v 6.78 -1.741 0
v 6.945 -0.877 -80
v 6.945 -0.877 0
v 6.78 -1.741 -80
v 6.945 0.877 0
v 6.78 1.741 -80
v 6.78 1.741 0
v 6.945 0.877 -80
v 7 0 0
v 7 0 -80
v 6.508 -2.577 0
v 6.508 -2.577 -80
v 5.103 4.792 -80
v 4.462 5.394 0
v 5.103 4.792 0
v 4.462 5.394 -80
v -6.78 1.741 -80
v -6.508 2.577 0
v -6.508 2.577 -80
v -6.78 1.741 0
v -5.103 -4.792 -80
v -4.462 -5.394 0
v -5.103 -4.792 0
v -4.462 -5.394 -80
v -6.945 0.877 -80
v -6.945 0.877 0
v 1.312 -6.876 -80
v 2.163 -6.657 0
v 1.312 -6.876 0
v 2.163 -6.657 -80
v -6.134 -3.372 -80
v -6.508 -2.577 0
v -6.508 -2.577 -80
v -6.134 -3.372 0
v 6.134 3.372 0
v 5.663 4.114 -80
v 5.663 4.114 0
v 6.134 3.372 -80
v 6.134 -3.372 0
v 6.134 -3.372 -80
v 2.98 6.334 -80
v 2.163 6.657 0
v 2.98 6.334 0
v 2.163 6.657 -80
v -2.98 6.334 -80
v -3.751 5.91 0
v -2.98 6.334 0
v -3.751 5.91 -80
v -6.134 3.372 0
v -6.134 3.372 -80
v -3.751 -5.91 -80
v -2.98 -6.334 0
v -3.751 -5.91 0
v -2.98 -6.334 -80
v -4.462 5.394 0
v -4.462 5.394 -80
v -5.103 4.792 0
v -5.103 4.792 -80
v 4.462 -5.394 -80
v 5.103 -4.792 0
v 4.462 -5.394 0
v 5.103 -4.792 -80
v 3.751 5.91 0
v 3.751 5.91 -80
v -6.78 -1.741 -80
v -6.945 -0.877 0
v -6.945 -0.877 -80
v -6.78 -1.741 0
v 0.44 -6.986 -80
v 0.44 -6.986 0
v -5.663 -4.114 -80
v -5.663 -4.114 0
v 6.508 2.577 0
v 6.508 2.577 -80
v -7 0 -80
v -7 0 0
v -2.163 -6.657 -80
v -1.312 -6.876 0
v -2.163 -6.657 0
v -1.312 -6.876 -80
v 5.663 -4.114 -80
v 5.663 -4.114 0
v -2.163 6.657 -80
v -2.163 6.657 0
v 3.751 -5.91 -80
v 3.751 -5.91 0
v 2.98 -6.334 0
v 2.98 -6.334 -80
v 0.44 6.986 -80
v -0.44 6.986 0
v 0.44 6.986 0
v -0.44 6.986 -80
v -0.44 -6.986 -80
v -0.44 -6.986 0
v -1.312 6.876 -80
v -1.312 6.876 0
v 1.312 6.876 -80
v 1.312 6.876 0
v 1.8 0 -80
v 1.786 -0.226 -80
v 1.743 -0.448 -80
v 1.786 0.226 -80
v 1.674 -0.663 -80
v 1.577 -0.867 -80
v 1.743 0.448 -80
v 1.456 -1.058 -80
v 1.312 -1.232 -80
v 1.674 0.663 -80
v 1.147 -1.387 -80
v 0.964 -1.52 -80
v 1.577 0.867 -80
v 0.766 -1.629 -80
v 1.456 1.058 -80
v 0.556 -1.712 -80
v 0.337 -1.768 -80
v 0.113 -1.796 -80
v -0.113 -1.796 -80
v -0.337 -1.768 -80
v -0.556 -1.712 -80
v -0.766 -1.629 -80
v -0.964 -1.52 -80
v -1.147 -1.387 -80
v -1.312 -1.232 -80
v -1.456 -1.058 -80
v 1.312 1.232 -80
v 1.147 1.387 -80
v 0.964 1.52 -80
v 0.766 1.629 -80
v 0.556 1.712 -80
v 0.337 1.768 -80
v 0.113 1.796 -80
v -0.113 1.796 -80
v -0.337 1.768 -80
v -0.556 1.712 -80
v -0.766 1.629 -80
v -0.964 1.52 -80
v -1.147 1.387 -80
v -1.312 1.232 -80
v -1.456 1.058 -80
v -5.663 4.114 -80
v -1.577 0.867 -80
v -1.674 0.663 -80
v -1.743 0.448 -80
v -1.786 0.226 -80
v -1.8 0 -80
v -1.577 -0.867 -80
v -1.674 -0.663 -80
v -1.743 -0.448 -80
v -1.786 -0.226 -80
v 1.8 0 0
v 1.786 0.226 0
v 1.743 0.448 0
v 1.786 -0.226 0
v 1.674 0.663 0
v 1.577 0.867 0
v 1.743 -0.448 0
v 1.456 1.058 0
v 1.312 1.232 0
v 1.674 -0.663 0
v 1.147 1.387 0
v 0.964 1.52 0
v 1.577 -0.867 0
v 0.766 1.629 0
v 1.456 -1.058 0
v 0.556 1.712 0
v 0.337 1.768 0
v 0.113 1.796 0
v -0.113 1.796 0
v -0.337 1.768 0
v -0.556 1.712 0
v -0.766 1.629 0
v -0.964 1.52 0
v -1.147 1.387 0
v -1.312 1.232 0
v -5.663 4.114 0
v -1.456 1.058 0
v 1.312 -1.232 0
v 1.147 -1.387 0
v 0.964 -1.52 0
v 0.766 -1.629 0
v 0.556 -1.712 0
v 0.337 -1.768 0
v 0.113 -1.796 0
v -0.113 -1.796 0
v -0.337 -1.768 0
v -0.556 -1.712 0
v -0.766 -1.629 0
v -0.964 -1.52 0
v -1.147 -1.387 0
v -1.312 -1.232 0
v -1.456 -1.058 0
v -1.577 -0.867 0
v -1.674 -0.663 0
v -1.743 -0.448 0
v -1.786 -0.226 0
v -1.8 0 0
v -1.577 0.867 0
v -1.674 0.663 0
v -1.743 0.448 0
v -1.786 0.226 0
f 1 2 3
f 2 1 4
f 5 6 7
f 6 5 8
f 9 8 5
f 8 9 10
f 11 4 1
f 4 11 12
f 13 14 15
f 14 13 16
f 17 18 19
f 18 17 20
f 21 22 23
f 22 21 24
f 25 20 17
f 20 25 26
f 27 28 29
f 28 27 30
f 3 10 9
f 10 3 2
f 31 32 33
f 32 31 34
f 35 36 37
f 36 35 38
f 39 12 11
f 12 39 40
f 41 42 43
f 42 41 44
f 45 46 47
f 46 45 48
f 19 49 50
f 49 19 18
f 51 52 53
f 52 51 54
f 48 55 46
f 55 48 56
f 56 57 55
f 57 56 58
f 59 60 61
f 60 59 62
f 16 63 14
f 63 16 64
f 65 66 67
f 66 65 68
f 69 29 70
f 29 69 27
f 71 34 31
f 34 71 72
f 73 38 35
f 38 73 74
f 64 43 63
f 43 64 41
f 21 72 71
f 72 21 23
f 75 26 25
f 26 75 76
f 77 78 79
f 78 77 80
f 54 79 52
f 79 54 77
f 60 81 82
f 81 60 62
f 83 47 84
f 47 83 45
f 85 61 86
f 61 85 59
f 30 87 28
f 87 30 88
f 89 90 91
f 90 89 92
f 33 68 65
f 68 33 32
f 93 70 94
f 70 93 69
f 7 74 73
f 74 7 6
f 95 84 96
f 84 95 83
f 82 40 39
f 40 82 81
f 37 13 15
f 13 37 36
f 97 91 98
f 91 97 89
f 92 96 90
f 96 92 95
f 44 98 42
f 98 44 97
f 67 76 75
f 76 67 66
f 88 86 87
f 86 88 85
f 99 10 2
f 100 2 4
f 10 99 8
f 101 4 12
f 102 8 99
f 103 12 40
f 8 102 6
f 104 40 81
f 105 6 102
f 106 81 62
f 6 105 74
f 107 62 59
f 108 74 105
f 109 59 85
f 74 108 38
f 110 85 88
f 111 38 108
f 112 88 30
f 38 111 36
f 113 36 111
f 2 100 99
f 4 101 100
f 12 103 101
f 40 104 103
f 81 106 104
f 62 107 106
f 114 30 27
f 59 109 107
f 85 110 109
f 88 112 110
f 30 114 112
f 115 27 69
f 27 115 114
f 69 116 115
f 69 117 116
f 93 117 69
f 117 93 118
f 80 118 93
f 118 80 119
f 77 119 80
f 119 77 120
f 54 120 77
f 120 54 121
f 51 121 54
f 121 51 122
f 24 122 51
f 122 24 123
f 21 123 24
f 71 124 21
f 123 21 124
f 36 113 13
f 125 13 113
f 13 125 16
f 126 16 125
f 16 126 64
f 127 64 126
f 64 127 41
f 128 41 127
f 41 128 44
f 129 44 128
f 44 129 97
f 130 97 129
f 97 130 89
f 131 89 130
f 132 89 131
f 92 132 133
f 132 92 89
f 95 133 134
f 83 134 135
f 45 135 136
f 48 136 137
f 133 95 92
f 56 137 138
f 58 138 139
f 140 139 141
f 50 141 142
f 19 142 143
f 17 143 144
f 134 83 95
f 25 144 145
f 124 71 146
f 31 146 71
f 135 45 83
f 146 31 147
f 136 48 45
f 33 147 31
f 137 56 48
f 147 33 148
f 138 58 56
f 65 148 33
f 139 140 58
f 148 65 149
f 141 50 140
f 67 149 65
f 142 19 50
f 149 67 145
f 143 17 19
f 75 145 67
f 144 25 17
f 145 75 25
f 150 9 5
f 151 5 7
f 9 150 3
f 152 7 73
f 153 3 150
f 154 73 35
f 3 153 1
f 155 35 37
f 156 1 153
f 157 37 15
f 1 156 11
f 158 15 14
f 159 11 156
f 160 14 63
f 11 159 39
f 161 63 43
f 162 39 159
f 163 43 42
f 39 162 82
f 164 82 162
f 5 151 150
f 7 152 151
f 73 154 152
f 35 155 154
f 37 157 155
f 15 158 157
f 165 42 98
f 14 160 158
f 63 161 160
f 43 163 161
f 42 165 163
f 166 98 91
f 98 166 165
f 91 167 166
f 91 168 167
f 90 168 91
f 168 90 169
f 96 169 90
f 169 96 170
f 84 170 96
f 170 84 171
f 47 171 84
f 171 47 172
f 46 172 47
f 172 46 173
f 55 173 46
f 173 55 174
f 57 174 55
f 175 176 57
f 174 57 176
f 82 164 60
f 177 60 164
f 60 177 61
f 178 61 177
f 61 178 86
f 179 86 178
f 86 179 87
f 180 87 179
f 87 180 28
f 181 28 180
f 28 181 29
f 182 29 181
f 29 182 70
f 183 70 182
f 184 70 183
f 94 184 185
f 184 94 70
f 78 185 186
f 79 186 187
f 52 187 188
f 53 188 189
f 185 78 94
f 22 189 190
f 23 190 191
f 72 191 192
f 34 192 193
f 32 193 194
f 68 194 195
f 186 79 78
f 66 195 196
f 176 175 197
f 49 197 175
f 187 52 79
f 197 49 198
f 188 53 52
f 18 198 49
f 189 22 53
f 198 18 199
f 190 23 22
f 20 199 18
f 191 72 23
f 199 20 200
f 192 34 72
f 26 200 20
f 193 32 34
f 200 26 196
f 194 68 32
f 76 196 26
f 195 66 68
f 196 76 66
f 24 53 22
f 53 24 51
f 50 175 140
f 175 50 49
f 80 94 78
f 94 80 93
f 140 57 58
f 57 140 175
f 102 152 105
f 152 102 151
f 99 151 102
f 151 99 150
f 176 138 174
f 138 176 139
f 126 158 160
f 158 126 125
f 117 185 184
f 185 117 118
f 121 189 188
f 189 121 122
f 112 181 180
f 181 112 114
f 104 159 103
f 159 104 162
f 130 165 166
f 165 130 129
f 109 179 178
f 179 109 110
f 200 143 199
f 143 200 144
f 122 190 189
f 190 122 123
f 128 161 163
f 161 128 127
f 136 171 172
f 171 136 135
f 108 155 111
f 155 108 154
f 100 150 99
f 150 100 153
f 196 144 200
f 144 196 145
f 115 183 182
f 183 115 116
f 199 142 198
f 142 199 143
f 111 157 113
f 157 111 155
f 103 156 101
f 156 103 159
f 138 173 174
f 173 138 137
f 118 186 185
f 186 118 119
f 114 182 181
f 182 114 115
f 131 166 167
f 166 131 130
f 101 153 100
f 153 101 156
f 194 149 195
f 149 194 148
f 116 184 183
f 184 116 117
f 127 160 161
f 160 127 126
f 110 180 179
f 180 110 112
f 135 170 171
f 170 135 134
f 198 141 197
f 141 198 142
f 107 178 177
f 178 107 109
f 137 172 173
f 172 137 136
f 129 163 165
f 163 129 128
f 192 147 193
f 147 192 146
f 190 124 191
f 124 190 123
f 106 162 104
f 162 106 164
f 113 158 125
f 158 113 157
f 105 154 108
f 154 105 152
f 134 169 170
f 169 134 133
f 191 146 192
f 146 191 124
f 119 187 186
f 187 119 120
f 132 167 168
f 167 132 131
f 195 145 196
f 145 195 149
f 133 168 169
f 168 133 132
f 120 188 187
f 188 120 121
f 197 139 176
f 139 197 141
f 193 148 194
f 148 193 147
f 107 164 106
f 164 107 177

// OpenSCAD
$fn = 50;


difference() {
	union() {
		translate(v = [0, 0, -80.0000000000]) {
			cylinder(h = 80, r = 7.0000000000);
		}
		cylinder(h = 0, r = 13.0000000000);
	}
	union() {
		#translate(v = [0, 0, -80]) {
			cylinder(h = 80, r = 1.8000000000);
		}
	}
}
